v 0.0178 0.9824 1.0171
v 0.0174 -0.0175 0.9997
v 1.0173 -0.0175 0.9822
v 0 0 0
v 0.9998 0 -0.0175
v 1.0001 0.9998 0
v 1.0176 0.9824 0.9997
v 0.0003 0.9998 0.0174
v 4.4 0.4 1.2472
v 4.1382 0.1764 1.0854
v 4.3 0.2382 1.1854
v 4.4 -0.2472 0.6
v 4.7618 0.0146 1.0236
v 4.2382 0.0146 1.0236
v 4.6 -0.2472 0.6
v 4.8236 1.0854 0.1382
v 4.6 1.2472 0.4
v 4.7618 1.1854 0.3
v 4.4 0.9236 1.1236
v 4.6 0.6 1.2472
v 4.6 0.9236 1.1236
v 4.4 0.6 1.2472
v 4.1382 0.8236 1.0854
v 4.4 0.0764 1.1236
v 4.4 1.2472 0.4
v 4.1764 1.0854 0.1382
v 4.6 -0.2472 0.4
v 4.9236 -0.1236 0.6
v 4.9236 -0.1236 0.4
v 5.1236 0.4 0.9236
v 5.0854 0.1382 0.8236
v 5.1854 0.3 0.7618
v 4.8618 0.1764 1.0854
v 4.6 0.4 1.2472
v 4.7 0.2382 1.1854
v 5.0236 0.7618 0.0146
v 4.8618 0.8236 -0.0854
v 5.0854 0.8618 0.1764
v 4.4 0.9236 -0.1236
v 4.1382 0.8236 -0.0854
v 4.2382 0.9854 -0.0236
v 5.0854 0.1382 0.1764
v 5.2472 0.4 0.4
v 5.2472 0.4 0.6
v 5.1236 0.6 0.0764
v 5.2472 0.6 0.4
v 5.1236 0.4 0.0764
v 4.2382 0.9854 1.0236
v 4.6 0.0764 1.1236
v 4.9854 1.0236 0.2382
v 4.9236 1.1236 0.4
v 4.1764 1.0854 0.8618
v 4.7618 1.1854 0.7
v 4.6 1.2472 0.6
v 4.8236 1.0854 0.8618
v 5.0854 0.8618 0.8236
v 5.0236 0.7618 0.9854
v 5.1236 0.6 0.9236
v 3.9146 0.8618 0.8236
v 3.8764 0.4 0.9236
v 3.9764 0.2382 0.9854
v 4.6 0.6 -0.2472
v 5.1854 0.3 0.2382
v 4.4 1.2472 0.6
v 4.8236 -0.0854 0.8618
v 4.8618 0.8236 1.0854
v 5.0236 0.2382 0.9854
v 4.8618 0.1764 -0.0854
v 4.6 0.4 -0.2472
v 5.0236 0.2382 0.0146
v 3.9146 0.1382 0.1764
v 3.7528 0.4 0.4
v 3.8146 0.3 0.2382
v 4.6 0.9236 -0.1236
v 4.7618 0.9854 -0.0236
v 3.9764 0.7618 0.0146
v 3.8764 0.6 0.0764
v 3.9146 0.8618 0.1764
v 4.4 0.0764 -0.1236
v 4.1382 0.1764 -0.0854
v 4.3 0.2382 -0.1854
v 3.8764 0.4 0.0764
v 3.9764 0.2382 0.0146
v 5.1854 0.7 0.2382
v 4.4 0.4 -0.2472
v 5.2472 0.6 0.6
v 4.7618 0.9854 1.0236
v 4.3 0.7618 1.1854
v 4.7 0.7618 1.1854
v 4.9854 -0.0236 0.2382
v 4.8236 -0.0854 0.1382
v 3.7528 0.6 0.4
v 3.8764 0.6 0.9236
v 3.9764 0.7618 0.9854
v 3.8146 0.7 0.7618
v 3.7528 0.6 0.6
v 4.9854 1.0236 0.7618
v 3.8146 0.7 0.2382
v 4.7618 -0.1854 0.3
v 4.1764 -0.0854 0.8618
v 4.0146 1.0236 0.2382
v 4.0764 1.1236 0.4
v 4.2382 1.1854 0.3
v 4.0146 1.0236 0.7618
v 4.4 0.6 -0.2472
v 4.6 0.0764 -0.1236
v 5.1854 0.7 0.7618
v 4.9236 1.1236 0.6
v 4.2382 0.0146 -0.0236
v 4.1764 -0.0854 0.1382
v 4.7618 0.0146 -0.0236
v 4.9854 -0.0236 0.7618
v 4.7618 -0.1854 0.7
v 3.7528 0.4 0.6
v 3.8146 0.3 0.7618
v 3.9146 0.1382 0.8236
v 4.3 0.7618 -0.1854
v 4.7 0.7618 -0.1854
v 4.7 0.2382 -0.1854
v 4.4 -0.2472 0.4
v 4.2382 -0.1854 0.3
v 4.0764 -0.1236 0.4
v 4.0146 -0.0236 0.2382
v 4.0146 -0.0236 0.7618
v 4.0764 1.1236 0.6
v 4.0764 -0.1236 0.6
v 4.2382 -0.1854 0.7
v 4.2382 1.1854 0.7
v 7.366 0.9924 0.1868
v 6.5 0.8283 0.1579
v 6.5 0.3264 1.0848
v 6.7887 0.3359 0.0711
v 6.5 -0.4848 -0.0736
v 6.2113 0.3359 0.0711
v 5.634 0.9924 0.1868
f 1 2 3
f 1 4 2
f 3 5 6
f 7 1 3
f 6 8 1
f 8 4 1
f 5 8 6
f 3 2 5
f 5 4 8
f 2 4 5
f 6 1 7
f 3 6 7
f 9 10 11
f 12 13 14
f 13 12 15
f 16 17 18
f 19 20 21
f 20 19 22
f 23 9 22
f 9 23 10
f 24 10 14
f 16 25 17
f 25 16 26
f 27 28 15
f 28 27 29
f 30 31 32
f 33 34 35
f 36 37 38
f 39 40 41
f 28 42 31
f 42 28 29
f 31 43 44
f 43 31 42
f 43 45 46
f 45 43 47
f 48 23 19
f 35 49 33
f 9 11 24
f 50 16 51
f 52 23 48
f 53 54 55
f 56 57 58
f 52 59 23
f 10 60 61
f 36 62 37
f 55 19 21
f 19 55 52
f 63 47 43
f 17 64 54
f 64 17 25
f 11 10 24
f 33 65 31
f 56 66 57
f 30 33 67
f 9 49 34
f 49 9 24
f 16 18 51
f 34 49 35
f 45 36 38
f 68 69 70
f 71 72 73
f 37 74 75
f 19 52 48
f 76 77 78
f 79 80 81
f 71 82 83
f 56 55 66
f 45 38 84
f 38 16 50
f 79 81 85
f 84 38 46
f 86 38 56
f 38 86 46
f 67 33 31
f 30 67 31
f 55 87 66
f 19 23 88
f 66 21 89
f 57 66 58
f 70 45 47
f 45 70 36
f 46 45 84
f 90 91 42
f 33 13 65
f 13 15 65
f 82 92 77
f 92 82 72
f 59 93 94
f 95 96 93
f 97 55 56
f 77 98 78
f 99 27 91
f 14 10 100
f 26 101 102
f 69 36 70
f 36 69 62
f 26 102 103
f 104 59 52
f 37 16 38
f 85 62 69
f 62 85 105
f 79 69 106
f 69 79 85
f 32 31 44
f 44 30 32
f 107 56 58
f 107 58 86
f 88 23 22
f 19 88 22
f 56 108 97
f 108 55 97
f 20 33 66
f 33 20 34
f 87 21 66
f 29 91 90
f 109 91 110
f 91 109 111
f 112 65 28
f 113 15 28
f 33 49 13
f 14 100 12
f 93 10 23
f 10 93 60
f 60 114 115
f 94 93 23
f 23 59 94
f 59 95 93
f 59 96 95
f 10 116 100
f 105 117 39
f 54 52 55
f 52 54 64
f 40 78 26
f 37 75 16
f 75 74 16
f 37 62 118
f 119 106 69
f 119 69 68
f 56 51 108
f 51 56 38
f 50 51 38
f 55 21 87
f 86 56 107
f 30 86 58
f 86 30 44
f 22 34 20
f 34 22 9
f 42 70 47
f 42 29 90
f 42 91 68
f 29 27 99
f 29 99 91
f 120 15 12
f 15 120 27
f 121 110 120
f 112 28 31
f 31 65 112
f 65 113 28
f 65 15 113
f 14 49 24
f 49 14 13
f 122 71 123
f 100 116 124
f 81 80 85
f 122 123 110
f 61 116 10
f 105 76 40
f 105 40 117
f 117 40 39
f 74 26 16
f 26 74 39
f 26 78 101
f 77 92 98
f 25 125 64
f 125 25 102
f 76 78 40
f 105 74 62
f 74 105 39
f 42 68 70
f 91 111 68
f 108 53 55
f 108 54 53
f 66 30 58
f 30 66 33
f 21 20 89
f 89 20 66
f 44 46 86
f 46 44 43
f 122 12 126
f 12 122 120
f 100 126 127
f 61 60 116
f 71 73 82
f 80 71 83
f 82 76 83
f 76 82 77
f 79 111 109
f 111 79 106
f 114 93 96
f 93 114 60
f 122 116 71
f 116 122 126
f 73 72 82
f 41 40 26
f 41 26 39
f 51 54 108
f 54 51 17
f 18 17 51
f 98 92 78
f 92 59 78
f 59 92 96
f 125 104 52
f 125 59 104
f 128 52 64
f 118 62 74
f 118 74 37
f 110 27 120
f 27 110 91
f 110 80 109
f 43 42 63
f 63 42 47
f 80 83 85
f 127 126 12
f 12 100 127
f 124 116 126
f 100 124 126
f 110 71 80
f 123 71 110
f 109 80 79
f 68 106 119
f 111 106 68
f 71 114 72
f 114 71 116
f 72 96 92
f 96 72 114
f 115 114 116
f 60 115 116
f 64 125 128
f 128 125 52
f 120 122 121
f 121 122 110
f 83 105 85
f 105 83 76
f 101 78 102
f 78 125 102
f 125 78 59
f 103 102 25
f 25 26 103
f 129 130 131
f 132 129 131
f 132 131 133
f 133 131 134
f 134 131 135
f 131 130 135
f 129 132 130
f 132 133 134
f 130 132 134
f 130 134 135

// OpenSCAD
// Used to cause issue #349

// Very slightly non-planar polyhedron
polyhedron(faces=[[3,2,1,0],[7,6,5,4],[0,1,6,7],[1,2,5,6],[2,3,4,5],[3,0,7,4]],
points=[
    [0.0174497,-0.0174524,0.999695],
    [1.0173,-0.0174524,0.982243],
    [1.0176,0.982395,0.999693],
    [0.0177543,0.982395,1.01715],
    [0.000304586,0.999848,0.0174497],
    [1.00015,0.999848,-0.00000265809],
    [0.999848,-0.0000000000000271051,-0.0174524],
    [0,0,0]]);

// Really non-planar polyhedron
translate([2,0,0]) polyhedron(faces=[[3,2,1,0],[7,6,5,4],[0,1,6,7],[1,2,5,6],[2,3,4,5],[3,0,7,4]],
points=[
    [0,0,1],
    [1,0.2,1],
    [1,1,1],
    [0,1,1],
    [0,1,0],
    [1,1,0],
    [1,0,0],
    [0,0,0]]);

// Real-world example: truncated icosidodecahedron
translate([4.5,0.5,0.5]) scale(0.02) polyhedron(points = [
[-10., -13.090169943749475, -34.270509831248425], 
[-10., -13.090169943749475, 34.270509831248425], 
[-10., 13.090169943749475, -34.270509831248425], 
[-10., 13.090169943749475, 34.270509831248425], 
[-5., -5., -37.3606797749979], [-5., -5., 37.3606797749979], 
[-5., 5., -37.3606797749979], [-5., 5., 37.3606797749979], 
[-5., -37.3606797749979, -5.], [-5., -37.3606797749979, 5.], 
[-5., -21.18033988749895, -31.18033988749895], 
[-5., -21.18033988749895, 31.18033988749895], [-5., 37.3606797749979, -5.], 
[-5., 37.3606797749979, 5.], [-5., 21.18033988749895, -31.18033988749895], 
[-5., 21.18033988749895, 31.18033988749895], [5., -5., -37.3606797749979], 
[5., -5., 37.3606797749979], [5., 5., -37.3606797749979], 
[5., 5., 37.3606797749979], [5., -37.3606797749979, -5.], 
[5., -37.3606797749979, 5.], [5., -21.18033988749895, -31.18033988749895], 
[5., -21.18033988749895, 31.18033988749895], [5., 37.3606797749979, -5.], 
[5., 37.3606797749979, 5.], [5., 21.18033988749895, -31.18033988749895], 
[5., 21.18033988749895, 31.18033988749895], [10., -13.090169943749475, 
 -34.270509831248425], [10., -13.090169943749475, 34.270509831248425], 
[10., 13.090169943749475, -34.270509831248425], 
[10., 13.090169943749475, 34.270509831248425], 
[-34.270509831248425, -10., -13.090169943749475], 
[-34.270509831248425, -10., 13.090169943749475], 
[-34.270509831248425, 10., -13.090169943749475], 
[-34.270509831248425, 10., 13.090169943749475], 
[-29.270509831248425, -18.090169943749473, -16.18033988749895], 
[-29.270509831248425, -18.090169943749473, 16.18033988749895], 
[-29.270509831248425, 18.090169943749473, -16.18033988749895], 
[-29.270509831248425, 18.090169943749473, 16.18033988749895], 
[-18.090169943749473, -16.18033988749895, -29.270509831248425], 
[-18.090169943749473, -16.18033988749895, 29.270509831248425], 
[-18.090169943749473, 16.18033988749895, -29.270509831248425], 
[-18.090169943749473, 16.18033988749895, 29.270509831248425], 
[-13.090169943749475, -34.270509831248425, -10.], 
[-13.090169943749475, -34.270509831248425, 10.], 
[-13.090169943749475, -24.270509831248425, -26.18033988749895], 
[-13.090169943749475, -24.270509831248425, 26.18033988749895], 
[-13.090169943749475, 24.270509831248425, -26.18033988749895], 
[-13.090169943749475, 24.270509831248425, 26.18033988749895], 
[-13.090169943749475, 34.270509831248425, -10.], 
[-13.090169943749475, 34.270509831248425, 10.], 
[-26.18033988749895, -13.090169943749475, -24.270509831248425], 
[-26.18033988749895, -13.090169943749475, 24.270509831248425], 
[-26.18033988749895, 13.090169943749475, -24.270509831248425], 
[-26.18033988749895, 13.090169943749475, 24.270509831248425], 
[-37.3606797749979, -5., -5.], [-37.3606797749979, -5., 5.], 
[-37.3606797749979, 5., -5.], [-37.3606797749979, 5., 5.], 
[-16.18033988749895, -29.270509831248425, -18.090169943749473], 
[-16.18033988749895, -29.270509831248425, 18.090169943749473], 
[-16.18033988749895, 29.270509831248425, -18.090169943749473], 
[-16.18033988749895, 29.270509831248425, 18.090169943749473], 
[-31.18033988749895, -5., -21.18033988749895], 
[-31.18033988749895, -5., 21.18033988749895], 
[-31.18033988749895, 5., -21.18033988749895], 
[-31.18033988749895, 5., 21.18033988749895], 
[-21.18033988749895, -31.18033988749895, -5.], 
[-21.18033988749895, -31.18033988749895, 5.], 
[-21.18033988749895, 31.18033988749895, -5.], 
[-21.18033988749895, 31.18033988749895, 5.], 
[-24.270509831248425, -26.18033988749895, -13.090169943749475], 
[-24.270509831248425, -26.18033988749895, 13.090169943749475], 
[-24.270509831248425, 26.18033988749895, -13.090169943749475], 
[-24.270509831248425, 26.18033988749895, 13.090169943749475], 
[16.18033988749895, -29.270509831248425, -18.090169943749473], 
[16.18033988749895, -29.270509831248425, 18.090169943749473], 
[16.18033988749895, 29.270509831248425, -18.090169943749473], 
[16.18033988749895, 29.270509831248425, 18.090169943749473], 
[24.270509831248425, -26.18033988749895, -13.090169943749475], 
[24.270509831248425, -26.18033988749895, 13.090169943749475], 
[24.270509831248425, 26.18033988749895, -13.090169943749475], 
[24.270509831248425, 26.18033988749895, 13.090169943749475], 
[37.3606797749979, -5., -5.], [37.3606797749979, -5., 5.], 
[37.3606797749979, 5., -5.], [37.3606797749979, 5., 5.], 
[21.18033988749895, -31.18033988749895, -5.], 
[21.18033988749895, -31.18033988749895, 5.], 
[21.18033988749895, 31.18033988749895, -5.], 
[21.18033988749895, 31.18033988749895, 5.], 
[13.090169943749475, -34.270509831248425, -10.], 
[13.090169943749475, -34.270509831248425, 10.], 
[13.090169943749475, -24.270509831248425, -26.18033988749895], 
[13.090169943749475, -24.270509831248425, 26.18033988749895], 
[13.090169943749475, 24.270509831248425, -26.18033988749895], 
[13.090169943749475, 24.270509831248425, 26.18033988749895], 
[13.090169943749475, 34.270509831248425, -10.], 
[13.090169943749475, 34.270509831248425, 10.], 
[26.18033988749895, -13.090169943749475, -24.270509831248425], 
[26.18033988749895, -13.090169943749475, 24.270509831248425], 
[26.18033988749895, 13.090169943749475, -24.270509831248425], 
[26.18033988749895, 13.090169943749475, 24.270509831248425], 
[31.18033988749895, -5., -21.18033988749895], 
[31.18033988749895, -5., 21.18033988749895], 
[31.18033988749895, 5., -21.18033988749895], 
[31.18033988749895, 5., 21.18033988749895], 
[18.090169943749473, -16.18033988749895, -29.270509831248425], 
[18.090169943749473, -16.18033988749895, 29.270509831248425], 
[18.090169943749473, 16.18033988749895, -29.270509831248425], 
[18.090169943749473, 16.18033988749895, 29.270509831248425], 
[29.270509831248425, -18.090169943749473, -16.18033988749895], 
[29.270509831248425, -18.090169943749473, 16.18033988749895], 
[29.270509831248425, 18.090169943749473, -16.18033988749895], 
[29.270509831248425, 18.090169943749473, 16.18033988749895], 
[34.270509831248425, -10., -13.090169943749475], 
[34.270509831248425, -10., 13.090169943749475], 
[34.270509831248425, 10., -13.090169943749475], 
[34.270509831248425, 10., 13.090169943749475]],faces = 
[[41, 53, 65, 67, 55, 43, 3, 7, 5, 1], [100, 104, 106, 102, 110, 30, 18, 16, 
 28, 108], [11, 1, 5, 17, 29, 23], [18, 30, 26, 14, 2, 6], 
[33, 37, 73, 69, 68, 72, 36, 32, 56, 57], [91, 90, 82, 114, 118, 86, 87, 
 119, 115, 83], [81, 113, 117, 85, 84, 116, 112, 80, 88, 89], 
[59, 58, 34, 38, 74, 70, 71, 75, 39, 35], [0, 10, 22, 28, 16, 4], 
[15, 27, 31, 19, 7, 3], [64, 52, 40, 0, 4, 6, 2, 42, 54, 66], 
[19, 31, 111, 103, 107, 105, 101, 109, 29, 17], [96, 110, 102, 114, 82, 78], 
[53, 41, 47, 61, 73, 37], [43, 49, 15, 3], [94, 108, 28, 22], 
[23, 29, 109, 95], [2, 14, 48, 42], [36, 72, 60, 46, 40, 52], 
[79, 83, 115, 103, 111, 97], [69, 45, 9, 8, 44, 68], 
[24, 98, 90, 91, 99, 25], [77, 95, 109, 101, 113, 81], 
[42, 48, 62, 74, 38, 54], [40, 46, 10, 0], [97, 111, 31, 27], 
[44, 8, 20, 92, 76, 94, 22, 10, 46, 60], [63, 51, 13, 25, 99, 79, 97, 27, 
 15, 49], [26, 30, 110, 96], [1, 11, 47, 41], [55, 39, 75, 63, 49, 43], 
[80, 112, 100, 108, 94, 76], [48, 14, 26, 96, 78, 98, 24, 12, 50, 62], 
[61, 47, 11, 23, 95, 77, 93, 21, 9, 45], [71, 70, 50, 12, 13, 51], 
[93, 89, 88, 92, 20, 21], [102, 106, 118, 114], [65, 53, 37, 33], 
[74, 62, 50, 70], [77, 81, 89, 93], [101, 105, 117, 113], [66, 54, 38, 34], 
[73, 61, 45, 69], [78, 82, 90, 98], [32, 36, 52, 64], [115, 119, 107, 103], 
[92, 88, 80, 76], [71, 51, 63, 75], [56, 32, 64, 66, 34, 58], 
[107, 119, 87, 85, 117, 105], [35, 39, 55, 67], [112, 116, 104, 100], 
[99, 91, 83, 79], [68, 44, 60, 72], [57, 59, 35, 67, 65, 33], 
[116, 84, 86, 118, 106, 104], [4, 16, 18, 6], [7, 19, 17, 5], 
[12, 24, 25, 13], [9, 21, 20, 8], [56, 58, 59, 57], [85, 87, 86, 84]]
);

translate([6,0,0]) polyhedron(points = [[0.5, 0.326352, 1.08481], [0.5, 0.828269, 0.157883], [1.36603, 0.992404, 0.186824], [0.788675, 0.335865, 0.0710586], [0.5, -0.484808, -0.0736482], [0.211325, 0.335865, 0.0710586], [-0.366025, 0.992404, 0.186824]], faces = [[0, 1, 2], [0, 2, 3], [0, 3, 4], [0, 4, 5], [0, 5, 6], [0, 6, 1], [6, 5, 4, 3, 2, 1]]);
